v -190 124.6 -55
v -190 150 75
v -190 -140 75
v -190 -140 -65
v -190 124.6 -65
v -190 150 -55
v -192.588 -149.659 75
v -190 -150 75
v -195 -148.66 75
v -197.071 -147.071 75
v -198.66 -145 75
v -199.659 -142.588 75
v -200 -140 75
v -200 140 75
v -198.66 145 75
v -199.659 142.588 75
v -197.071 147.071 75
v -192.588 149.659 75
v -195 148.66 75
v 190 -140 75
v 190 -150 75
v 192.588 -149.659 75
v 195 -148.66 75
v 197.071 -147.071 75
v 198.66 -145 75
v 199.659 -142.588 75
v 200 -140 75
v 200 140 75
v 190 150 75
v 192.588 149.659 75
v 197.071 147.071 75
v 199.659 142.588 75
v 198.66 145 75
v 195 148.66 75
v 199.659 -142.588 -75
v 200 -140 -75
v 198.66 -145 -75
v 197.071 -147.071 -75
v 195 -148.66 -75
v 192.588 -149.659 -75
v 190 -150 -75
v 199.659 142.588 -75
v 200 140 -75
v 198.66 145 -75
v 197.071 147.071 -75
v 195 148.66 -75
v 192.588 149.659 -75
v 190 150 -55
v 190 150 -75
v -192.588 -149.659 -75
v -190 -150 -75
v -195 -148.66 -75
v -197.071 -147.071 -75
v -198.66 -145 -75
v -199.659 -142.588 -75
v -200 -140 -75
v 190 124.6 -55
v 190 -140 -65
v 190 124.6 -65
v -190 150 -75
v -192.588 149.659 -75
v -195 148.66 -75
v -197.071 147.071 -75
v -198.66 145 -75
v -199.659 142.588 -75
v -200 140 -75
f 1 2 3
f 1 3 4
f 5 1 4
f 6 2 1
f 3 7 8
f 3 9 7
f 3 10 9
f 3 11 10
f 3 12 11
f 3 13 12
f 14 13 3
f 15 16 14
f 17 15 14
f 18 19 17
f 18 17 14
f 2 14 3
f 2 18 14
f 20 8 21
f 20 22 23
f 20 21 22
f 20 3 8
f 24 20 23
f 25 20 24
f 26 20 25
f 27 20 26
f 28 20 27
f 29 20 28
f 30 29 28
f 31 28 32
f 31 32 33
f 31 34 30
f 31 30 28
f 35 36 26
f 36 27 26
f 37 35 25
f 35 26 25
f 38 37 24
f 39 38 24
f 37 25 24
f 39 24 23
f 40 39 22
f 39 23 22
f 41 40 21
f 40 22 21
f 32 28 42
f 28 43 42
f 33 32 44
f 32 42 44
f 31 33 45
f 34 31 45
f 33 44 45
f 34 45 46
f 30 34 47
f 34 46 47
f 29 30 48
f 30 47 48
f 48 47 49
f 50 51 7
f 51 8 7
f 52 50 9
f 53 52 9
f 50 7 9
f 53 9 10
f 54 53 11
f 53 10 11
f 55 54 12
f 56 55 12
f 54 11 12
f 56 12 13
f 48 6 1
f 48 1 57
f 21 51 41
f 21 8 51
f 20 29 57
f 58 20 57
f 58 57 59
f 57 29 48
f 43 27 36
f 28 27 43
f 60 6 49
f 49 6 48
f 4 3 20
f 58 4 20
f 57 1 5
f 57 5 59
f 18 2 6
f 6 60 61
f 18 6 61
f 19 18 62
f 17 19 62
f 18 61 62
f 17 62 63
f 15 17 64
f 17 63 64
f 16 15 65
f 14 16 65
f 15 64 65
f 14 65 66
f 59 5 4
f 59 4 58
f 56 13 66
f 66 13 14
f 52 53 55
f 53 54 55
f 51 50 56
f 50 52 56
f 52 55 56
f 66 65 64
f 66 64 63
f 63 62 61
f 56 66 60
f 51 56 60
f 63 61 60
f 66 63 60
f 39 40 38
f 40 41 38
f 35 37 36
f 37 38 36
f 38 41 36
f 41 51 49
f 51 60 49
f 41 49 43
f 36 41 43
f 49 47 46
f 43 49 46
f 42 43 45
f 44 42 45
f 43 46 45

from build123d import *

# Parameters (mm, degrees)
F0_W     = 400
F0_H     = 300
F1_DEPTH = 75
F2_T     = -10
F3_R     = 10
F4_R     = 10
F5_DEPTH = 25.4
F6_W     = 380
F6_H     = 25.4
F7_DEPTH = 10


with BuildPart() as f1:
    # F0 (on Top) → F1 (new body, symmetric)
    with BuildSketch(Plane.XY):
        Rectangle(F0_W, F0_H)
    extrude(amount=F1_DEPTH, both=True)

    # F2
    f2_openings = [f1.faces().sort_by_distance(p)[0] for p in [
        (0, 0, 75),
    ]]
    offset(amount=F2_T, openings=f2_openings)

    # F3
    f3_edges = [f1.edges().sort_by_distance(p)[0] for p in [
        (-200, 150, 0),
        (200, 150, 0),
    ]]
    fillet(f3_edges, radius=F3_R)

    # F4
    f4_edges = [f1.edges().sort_by_distance(p)[0] for p in [
        (200, -150, 0),
        (-200, -150, 0),
    ]]
    fillet(f4_edges, radius=F4_R)

    # F5 (cut): a face of the model
    f5_faces = [f1.faces().sort_by_distance(p)[0] for p in [
        (0, 150, 0),
    ]]
    extrude(f5_faces, amount=-F5_DEPTH, mode=Mode.SUBTRACT)

    # F6 (on face) → F7 (join, symmetric)
    with BuildSketch(Plane.XY.offset(-65)):
        with Locations((0, 137.3)):
            Rectangle(F6_W, F6_H)
    extrude(amount=F7_DEPTH, both=True)


solid = f1.part
